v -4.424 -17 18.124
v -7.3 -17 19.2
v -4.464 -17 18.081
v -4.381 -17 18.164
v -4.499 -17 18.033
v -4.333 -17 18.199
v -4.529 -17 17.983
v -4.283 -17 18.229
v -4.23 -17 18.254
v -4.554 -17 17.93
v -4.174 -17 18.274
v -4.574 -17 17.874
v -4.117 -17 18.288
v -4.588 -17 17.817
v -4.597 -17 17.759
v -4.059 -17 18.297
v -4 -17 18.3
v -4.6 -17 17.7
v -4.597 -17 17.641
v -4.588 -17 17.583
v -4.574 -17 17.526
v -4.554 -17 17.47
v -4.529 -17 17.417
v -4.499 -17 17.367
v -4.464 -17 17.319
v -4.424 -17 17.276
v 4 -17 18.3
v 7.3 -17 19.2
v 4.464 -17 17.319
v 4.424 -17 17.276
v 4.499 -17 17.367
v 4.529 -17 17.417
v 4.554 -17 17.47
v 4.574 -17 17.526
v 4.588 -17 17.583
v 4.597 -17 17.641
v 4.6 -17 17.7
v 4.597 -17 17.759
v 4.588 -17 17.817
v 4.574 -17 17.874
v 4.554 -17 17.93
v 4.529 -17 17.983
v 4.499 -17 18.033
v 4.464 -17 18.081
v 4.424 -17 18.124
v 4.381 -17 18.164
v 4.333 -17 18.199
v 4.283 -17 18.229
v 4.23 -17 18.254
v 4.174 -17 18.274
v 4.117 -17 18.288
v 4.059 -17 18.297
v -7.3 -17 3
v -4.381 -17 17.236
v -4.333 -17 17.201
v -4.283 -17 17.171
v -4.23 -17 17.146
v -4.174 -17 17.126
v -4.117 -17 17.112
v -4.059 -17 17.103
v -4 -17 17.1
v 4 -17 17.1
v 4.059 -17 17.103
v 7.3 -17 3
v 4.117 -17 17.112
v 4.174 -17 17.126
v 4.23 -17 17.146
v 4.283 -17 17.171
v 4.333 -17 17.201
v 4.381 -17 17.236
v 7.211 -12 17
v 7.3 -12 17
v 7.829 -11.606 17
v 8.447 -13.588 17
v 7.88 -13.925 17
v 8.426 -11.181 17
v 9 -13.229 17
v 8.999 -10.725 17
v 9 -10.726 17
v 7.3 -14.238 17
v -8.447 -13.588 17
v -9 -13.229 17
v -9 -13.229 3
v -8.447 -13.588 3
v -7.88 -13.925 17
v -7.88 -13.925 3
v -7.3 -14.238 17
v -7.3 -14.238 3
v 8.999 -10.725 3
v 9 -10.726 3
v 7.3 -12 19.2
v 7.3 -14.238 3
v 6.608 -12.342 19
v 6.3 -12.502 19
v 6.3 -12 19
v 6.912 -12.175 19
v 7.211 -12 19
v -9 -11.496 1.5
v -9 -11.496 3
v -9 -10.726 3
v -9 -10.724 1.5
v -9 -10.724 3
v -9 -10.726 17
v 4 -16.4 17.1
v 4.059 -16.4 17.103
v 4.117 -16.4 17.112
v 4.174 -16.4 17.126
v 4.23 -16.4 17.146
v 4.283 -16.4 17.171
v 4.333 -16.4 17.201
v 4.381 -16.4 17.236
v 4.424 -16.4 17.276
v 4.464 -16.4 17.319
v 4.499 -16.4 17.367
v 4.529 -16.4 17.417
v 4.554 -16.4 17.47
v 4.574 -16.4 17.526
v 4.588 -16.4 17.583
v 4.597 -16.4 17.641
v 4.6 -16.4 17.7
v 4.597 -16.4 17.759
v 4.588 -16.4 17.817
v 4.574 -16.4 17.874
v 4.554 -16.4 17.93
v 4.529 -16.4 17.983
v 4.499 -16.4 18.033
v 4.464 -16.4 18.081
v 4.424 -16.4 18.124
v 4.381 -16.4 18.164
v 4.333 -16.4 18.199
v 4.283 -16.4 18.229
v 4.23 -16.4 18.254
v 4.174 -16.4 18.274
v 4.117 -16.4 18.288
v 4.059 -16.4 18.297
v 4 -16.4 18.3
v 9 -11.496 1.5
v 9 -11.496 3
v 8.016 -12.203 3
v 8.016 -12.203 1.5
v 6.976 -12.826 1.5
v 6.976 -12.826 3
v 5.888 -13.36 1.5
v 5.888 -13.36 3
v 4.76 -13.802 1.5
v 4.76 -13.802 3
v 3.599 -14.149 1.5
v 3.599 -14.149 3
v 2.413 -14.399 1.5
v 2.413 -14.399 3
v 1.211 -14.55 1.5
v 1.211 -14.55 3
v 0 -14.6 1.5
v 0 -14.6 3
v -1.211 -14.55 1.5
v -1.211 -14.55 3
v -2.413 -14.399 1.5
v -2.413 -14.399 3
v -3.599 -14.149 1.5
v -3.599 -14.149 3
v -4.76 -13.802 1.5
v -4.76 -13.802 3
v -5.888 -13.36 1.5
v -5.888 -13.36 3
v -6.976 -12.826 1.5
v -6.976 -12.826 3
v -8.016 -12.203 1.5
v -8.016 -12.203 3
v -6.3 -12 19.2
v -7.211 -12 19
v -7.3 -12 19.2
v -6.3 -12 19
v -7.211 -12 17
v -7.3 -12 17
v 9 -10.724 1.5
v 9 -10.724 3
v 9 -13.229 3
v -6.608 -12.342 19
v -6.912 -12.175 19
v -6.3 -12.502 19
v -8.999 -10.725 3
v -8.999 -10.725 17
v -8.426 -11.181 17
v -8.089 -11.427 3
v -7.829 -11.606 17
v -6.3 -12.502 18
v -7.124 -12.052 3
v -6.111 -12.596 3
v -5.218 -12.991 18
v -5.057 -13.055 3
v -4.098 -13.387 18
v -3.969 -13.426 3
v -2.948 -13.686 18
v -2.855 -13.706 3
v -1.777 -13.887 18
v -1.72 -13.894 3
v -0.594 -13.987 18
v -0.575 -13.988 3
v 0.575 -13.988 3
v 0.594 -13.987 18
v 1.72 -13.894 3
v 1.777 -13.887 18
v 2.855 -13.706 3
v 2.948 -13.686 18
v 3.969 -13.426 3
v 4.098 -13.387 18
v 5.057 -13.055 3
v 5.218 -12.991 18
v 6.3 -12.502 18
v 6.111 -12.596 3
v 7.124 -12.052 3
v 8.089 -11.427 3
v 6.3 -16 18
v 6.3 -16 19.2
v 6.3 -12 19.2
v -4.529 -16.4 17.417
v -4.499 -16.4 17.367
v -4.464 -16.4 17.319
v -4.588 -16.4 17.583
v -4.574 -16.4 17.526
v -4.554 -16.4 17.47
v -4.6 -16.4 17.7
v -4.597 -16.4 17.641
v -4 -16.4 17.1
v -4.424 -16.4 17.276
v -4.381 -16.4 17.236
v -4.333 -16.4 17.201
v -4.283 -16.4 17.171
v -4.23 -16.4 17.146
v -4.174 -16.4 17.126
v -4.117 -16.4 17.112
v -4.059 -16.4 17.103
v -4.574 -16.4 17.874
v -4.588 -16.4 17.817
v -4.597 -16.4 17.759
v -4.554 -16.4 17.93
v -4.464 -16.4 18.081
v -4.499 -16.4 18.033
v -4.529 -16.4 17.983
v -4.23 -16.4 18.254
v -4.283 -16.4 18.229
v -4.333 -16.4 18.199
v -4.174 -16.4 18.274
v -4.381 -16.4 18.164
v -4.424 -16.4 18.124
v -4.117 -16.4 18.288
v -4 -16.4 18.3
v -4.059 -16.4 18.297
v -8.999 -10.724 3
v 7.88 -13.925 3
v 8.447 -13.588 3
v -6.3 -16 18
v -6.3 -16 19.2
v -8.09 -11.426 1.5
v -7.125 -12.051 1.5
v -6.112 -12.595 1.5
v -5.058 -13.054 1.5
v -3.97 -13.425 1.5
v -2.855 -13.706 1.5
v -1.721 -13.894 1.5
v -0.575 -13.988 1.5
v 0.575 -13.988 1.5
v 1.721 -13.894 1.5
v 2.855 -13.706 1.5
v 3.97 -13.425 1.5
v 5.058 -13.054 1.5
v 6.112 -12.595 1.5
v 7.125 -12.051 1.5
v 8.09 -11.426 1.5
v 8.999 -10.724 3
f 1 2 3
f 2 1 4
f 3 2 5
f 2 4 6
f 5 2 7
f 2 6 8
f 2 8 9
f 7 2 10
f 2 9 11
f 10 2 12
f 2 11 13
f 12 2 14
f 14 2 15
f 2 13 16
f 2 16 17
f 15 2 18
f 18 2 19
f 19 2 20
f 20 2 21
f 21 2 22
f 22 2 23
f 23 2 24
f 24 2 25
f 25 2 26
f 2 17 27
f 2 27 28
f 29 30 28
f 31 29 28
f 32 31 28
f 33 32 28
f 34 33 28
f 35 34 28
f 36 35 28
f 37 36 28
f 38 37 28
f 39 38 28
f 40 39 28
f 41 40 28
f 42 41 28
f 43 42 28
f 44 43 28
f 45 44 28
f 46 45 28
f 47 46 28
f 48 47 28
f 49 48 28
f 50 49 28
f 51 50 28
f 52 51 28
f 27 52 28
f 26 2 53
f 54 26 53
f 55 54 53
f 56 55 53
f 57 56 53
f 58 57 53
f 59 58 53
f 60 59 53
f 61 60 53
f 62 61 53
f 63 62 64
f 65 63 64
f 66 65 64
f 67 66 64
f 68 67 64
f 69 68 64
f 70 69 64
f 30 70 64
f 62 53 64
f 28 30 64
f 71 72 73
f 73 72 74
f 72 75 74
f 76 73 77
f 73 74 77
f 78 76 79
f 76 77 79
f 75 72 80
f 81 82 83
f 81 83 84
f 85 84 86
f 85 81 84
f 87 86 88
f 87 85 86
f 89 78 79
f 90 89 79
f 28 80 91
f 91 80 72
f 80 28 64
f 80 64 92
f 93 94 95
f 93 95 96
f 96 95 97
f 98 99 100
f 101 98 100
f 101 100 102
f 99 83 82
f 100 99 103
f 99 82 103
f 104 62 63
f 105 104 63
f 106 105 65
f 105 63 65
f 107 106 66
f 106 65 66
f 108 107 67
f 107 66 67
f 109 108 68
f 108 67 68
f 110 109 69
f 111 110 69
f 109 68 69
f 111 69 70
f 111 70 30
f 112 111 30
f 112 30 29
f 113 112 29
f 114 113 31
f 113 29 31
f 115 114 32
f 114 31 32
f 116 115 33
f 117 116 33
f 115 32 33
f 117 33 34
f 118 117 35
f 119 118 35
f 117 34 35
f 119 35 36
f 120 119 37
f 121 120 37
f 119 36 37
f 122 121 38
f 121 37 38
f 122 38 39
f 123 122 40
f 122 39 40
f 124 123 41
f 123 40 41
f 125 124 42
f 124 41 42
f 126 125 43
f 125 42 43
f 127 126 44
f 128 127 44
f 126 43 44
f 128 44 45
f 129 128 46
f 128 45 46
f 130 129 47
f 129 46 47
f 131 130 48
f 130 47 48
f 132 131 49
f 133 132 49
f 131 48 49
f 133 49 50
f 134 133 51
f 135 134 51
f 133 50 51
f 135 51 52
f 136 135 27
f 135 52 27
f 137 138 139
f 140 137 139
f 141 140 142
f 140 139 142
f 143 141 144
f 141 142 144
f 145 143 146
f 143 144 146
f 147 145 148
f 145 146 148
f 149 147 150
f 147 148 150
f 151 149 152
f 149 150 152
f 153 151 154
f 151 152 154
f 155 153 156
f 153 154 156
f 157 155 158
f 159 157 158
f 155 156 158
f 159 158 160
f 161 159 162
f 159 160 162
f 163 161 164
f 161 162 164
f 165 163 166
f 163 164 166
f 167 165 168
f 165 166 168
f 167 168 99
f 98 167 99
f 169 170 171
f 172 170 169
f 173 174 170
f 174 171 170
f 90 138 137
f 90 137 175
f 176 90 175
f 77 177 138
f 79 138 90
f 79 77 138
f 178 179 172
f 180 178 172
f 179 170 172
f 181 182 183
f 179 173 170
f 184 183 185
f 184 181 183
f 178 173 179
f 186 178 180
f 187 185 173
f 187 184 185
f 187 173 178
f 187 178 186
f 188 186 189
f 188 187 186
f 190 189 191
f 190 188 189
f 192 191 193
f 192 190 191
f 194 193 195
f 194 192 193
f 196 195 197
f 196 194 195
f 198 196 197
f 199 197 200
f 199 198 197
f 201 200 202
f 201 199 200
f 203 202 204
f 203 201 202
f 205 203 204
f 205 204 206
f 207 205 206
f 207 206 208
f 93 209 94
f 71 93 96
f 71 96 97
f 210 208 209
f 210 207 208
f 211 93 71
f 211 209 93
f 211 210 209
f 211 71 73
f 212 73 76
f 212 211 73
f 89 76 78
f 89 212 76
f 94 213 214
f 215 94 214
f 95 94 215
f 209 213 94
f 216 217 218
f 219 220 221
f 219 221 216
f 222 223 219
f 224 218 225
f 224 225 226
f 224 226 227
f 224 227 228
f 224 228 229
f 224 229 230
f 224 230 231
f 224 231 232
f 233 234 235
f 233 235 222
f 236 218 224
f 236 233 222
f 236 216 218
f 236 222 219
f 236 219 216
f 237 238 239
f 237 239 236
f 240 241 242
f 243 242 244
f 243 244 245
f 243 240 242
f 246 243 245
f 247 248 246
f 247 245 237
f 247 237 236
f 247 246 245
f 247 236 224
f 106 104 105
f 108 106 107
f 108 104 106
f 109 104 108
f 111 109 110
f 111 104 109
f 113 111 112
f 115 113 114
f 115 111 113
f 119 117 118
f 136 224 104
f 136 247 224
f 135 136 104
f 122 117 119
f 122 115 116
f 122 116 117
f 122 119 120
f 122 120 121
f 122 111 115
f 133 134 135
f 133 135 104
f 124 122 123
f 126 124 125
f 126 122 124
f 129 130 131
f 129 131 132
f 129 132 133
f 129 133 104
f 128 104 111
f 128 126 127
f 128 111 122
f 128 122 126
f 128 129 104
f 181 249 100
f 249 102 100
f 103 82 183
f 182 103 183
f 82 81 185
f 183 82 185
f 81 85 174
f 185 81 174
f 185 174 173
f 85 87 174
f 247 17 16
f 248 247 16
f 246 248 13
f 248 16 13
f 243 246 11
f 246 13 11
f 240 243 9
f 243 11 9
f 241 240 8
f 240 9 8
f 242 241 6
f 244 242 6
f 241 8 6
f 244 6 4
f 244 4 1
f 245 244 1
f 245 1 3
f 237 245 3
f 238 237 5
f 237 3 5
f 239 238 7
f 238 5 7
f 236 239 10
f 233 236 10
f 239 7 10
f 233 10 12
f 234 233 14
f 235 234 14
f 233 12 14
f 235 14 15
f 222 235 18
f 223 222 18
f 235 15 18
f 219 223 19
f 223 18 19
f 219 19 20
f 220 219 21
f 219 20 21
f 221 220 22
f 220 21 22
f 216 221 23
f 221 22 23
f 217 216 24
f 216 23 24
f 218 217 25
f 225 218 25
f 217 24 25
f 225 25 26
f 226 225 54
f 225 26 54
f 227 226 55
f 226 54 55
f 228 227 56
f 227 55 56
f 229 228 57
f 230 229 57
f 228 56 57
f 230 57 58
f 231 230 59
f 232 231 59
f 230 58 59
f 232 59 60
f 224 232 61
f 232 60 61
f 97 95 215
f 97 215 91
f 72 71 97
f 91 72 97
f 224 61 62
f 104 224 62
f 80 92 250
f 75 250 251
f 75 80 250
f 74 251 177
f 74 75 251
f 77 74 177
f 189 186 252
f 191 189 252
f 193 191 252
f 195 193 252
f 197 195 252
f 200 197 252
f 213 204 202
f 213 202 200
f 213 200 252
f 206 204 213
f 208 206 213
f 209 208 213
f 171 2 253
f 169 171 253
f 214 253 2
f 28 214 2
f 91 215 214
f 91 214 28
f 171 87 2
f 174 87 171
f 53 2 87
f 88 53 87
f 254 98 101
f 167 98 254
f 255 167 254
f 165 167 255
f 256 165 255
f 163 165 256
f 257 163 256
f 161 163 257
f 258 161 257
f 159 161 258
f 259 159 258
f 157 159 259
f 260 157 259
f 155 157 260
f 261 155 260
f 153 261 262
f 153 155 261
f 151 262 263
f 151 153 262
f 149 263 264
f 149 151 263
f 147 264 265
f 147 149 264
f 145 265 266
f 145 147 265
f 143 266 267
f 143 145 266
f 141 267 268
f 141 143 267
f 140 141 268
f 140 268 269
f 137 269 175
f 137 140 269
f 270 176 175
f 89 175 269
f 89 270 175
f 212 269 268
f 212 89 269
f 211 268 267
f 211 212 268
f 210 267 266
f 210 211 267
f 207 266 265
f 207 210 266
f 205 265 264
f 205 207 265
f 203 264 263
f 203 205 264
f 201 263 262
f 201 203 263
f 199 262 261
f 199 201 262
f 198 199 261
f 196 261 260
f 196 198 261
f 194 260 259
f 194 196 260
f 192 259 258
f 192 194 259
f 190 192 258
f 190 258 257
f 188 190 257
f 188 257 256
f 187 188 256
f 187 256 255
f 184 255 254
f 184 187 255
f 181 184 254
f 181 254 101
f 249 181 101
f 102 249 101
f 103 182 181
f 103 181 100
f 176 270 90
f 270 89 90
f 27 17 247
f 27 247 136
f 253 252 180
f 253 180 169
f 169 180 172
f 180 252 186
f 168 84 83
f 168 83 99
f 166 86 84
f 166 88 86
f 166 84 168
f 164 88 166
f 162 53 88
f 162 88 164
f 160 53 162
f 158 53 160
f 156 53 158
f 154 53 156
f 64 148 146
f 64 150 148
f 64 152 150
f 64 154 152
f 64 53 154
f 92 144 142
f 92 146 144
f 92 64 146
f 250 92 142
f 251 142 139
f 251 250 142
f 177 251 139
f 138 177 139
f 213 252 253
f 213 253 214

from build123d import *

# Parameters (mm, degrees)
BOX017_W                    = 12.6
BOX017_H                    = 10
BOX017_DEPTH                = 2
BOX016_W                    = 3
BOX016_H                    = 6
BOX016_DEPTH                = 20
BOX015_W                    = 3
BOX015_H                    = 6
BOX015_DEPTH                = 20
BOX013_W                    = 12.6
BOX013_H                    = 10
BOX013_DEPTH                = 1
CYLINDER016_R               = 4.5
CYLINDER016_DEPTH           = 1.5
SKETCH018_R                 = 2.1
PAD011_DEPTH                = 0.8
CYLINDER015_R               = 14
CYLINDER015_DEPTH           = 19
CYLINDER018_W               = 16
CYLINDER018_H               = 14
CYLINDER018_ANGLE           = 80
CYLINDER018_PLACEMENT_ANGLE = 230
BOX014_W                    = 14.6
BOX014_H                    = 5
BOX014_DEPTH                = 16.2
POCKET002_DEPTH             = 0.6
PAD012_DEPTH                = 1.5


with BuildPart() as cubo013:
    # Box017 → Box017 (new body)
    with BuildSketch(Plane(origin=(-6.3, -16, 18), x_dir=(1, 0, 0), z_dir=(0, 0, 1))):
        with Locations((6.3, 5)):
            Rectangle(BOX017_W, BOX017_H)
    extrude(amount=BOX017_DEPTH)


with BuildPart() as cubo012:
    # Box016 → Box016 (new body)
    with BuildSketch(Plane(origin=(-12, -15, 0), x_dir=(1, 0, 0), z_dir=(0, 0, 1))):
        with Locations((1.5, 3)):
            Rectangle(BOX016_W, BOX016_H)
    extrude(amount=BOX016_DEPTH)


with BuildPart() as arco_plastico001:
    # Box015 → Box015 (new body)
    with BuildSketch(Plane(origin=(9, -15, 0), x_dir=(1, 0, 0), z_dir=(0, 0, 1))):
        with Locations((1.5, 3)):
            Rectangle(BOX015_W, BOX015_H)
    extrude(amount=BOX015_DEPTH)

    # Fusion011: union Cubo012
    add(cubo012.part)


with BuildPart() as cubo009:
    # Box013 → Box013 (new body)
    with BuildSketch(Plane(origin=(-6.3, -16, 18), x_dir=(1, 0, 0), z_dir=(0, 0, 1))):
        with Locations((6.3, 5)):
            Rectangle(BOX013_W, BOX013_H)
    extrude(amount=BOX013_DEPTH)


with BuildPart() as cilindro008:
    # Cylinder016 → Cylinder016 (new body)
    with BuildSketch(Plane(origin=(0, 8, 19), x_dir=(1, 0, 0), z_dir=(0, 0, 1))):
        Circle(CYLINDER016_R)
    extrude(amount=CYLINDER016_DEPTH)


with BuildPart() as pad011:
    # Sketch018 → Pad011 (new body)
    with BuildSketch(Plane.XY.offset(18.2)):
        with BuildLine():
            ThreePointArc((-17.5, 3.5), (-21, 0), (-17.5, -3.5))
            Line((-17.5, -3.5), (17.5, -3.5))
            ThreePointArc((17.5, -3.5), (21, 0), (17.5, 3.5))
            Line((-17.5, 3.5), (17.5, 3.5))
        make_face()
        with Locations((-17.5, 0)):
            Circle(SKETCH018_R, mode=Mode.SUBTRACT)
        with Locations((17.5, 0)):
            Circle(SKETCH018_R, mode=Mode.SUBTRACT)
    extrude(amount=PAD011_DEPTH)


with BuildPart() as body001:
    # Cylinder015 → Cylinder015 (new body)
    with BuildSketch(Plane.XY):
        Circle(CYLINDER015_R)
    extrude(amount=CYLINDER015_DEPTH)

    # Fusion007: union Pad011
    add(pad011.part)

    # Fusion009: union Cilindro008
    add(cilindro008.part)

    # Fusion010: union Cubo009
    add(cubo009.part)


with BuildPart() as cut021:
    # Cylinder018 → Cylinder018 (revolve)
    with BuildSketch(Plane.XZ):
        with Locations((8, 7)):
            Rectangle(CYLINDER018_W, CYLINDER018_H)
    revolve(axis=Axis((0, 0, 0), (0, 0, 1)), revolution_arc=CYLINDER018_ANGLE)


with BuildPart() as cut021_1:
    # Cylinder018 placement: moved
    add(cut021.part.moved(Location((0, 0, 3))).rotate(Axis((0, 0, 3), (0, 0, 1)), CYLINDER018_PLACEMENT_ANGLE))

    # Cut020: cut Body001
    add(body001.part, mode=Mode.SUBTRACT)

    # Cut021: cut Arco_plastico001
    add(arco_plastico001.part, mode=Mode.SUBTRACT)


with BuildPart() as plastic_base_final001:
    # Box014 → Box014 (new body)
    with BuildSketch(Plane(origin=(-7.3, -17, 3), x_dir=(1, 0, 0), z_dir=(0, 0, 1))):
        with Locations((7.3, 2.5)):
            Rectangle(BOX014_W, BOX014_H)
    extrude(amount=BOX014_DEPTH)

    # Cut019: cut Body001
    add(body001.part, mode=Mode.SUBTRACT)

    # Fusion012: union Cut021
    add(cut021_1.part)

    # Cut022: cut Cubo013
    add(cubo013.part, mode=Mode.SUBTRACT)

    # Sketch019 (on Face5 of Cut022) → Pocket002 (cut)
    with BuildSketch(Plane.XZ.offset(17)):
        with BuildLine():
            ThreePointArc((-4, 18.3), (-4.6, 17.7), (-4, 17.1))
            Line((-4, 17.1), (4, 17.1))
            ThreePointArc((4, 17.1), (4.6, 17.7), (4, 18.3))
            Line((-4, 18.3), (4, 18.3))
        make_face()
    extrude(amount=-POCKET002_DEPTH, mode=Mode.SUBTRACT)

    # Sketch020 (on Face17 of Pocket002) → Pad012 (new body)
    with BuildSketch(Plane(origin=(0, 0, 3), x_dir=(1, 0, 0), z_dir=(0, 0, -1))):
        with BuildLine():
            ThreePointArc((9, 11.496086), (0, 14.6), (-9, 11.496086))
            Line((-9, 11.496086), (-9, 10.723805))
            ThreePointArc((9, 10.723805), (0, 14), (-9, 10.723805))
            Line((9, 11.496086), (9, 10.723805))
        make_face()
    extrude(amount=PAD012_DEPTH)


solid = plastic_base_final001.part
